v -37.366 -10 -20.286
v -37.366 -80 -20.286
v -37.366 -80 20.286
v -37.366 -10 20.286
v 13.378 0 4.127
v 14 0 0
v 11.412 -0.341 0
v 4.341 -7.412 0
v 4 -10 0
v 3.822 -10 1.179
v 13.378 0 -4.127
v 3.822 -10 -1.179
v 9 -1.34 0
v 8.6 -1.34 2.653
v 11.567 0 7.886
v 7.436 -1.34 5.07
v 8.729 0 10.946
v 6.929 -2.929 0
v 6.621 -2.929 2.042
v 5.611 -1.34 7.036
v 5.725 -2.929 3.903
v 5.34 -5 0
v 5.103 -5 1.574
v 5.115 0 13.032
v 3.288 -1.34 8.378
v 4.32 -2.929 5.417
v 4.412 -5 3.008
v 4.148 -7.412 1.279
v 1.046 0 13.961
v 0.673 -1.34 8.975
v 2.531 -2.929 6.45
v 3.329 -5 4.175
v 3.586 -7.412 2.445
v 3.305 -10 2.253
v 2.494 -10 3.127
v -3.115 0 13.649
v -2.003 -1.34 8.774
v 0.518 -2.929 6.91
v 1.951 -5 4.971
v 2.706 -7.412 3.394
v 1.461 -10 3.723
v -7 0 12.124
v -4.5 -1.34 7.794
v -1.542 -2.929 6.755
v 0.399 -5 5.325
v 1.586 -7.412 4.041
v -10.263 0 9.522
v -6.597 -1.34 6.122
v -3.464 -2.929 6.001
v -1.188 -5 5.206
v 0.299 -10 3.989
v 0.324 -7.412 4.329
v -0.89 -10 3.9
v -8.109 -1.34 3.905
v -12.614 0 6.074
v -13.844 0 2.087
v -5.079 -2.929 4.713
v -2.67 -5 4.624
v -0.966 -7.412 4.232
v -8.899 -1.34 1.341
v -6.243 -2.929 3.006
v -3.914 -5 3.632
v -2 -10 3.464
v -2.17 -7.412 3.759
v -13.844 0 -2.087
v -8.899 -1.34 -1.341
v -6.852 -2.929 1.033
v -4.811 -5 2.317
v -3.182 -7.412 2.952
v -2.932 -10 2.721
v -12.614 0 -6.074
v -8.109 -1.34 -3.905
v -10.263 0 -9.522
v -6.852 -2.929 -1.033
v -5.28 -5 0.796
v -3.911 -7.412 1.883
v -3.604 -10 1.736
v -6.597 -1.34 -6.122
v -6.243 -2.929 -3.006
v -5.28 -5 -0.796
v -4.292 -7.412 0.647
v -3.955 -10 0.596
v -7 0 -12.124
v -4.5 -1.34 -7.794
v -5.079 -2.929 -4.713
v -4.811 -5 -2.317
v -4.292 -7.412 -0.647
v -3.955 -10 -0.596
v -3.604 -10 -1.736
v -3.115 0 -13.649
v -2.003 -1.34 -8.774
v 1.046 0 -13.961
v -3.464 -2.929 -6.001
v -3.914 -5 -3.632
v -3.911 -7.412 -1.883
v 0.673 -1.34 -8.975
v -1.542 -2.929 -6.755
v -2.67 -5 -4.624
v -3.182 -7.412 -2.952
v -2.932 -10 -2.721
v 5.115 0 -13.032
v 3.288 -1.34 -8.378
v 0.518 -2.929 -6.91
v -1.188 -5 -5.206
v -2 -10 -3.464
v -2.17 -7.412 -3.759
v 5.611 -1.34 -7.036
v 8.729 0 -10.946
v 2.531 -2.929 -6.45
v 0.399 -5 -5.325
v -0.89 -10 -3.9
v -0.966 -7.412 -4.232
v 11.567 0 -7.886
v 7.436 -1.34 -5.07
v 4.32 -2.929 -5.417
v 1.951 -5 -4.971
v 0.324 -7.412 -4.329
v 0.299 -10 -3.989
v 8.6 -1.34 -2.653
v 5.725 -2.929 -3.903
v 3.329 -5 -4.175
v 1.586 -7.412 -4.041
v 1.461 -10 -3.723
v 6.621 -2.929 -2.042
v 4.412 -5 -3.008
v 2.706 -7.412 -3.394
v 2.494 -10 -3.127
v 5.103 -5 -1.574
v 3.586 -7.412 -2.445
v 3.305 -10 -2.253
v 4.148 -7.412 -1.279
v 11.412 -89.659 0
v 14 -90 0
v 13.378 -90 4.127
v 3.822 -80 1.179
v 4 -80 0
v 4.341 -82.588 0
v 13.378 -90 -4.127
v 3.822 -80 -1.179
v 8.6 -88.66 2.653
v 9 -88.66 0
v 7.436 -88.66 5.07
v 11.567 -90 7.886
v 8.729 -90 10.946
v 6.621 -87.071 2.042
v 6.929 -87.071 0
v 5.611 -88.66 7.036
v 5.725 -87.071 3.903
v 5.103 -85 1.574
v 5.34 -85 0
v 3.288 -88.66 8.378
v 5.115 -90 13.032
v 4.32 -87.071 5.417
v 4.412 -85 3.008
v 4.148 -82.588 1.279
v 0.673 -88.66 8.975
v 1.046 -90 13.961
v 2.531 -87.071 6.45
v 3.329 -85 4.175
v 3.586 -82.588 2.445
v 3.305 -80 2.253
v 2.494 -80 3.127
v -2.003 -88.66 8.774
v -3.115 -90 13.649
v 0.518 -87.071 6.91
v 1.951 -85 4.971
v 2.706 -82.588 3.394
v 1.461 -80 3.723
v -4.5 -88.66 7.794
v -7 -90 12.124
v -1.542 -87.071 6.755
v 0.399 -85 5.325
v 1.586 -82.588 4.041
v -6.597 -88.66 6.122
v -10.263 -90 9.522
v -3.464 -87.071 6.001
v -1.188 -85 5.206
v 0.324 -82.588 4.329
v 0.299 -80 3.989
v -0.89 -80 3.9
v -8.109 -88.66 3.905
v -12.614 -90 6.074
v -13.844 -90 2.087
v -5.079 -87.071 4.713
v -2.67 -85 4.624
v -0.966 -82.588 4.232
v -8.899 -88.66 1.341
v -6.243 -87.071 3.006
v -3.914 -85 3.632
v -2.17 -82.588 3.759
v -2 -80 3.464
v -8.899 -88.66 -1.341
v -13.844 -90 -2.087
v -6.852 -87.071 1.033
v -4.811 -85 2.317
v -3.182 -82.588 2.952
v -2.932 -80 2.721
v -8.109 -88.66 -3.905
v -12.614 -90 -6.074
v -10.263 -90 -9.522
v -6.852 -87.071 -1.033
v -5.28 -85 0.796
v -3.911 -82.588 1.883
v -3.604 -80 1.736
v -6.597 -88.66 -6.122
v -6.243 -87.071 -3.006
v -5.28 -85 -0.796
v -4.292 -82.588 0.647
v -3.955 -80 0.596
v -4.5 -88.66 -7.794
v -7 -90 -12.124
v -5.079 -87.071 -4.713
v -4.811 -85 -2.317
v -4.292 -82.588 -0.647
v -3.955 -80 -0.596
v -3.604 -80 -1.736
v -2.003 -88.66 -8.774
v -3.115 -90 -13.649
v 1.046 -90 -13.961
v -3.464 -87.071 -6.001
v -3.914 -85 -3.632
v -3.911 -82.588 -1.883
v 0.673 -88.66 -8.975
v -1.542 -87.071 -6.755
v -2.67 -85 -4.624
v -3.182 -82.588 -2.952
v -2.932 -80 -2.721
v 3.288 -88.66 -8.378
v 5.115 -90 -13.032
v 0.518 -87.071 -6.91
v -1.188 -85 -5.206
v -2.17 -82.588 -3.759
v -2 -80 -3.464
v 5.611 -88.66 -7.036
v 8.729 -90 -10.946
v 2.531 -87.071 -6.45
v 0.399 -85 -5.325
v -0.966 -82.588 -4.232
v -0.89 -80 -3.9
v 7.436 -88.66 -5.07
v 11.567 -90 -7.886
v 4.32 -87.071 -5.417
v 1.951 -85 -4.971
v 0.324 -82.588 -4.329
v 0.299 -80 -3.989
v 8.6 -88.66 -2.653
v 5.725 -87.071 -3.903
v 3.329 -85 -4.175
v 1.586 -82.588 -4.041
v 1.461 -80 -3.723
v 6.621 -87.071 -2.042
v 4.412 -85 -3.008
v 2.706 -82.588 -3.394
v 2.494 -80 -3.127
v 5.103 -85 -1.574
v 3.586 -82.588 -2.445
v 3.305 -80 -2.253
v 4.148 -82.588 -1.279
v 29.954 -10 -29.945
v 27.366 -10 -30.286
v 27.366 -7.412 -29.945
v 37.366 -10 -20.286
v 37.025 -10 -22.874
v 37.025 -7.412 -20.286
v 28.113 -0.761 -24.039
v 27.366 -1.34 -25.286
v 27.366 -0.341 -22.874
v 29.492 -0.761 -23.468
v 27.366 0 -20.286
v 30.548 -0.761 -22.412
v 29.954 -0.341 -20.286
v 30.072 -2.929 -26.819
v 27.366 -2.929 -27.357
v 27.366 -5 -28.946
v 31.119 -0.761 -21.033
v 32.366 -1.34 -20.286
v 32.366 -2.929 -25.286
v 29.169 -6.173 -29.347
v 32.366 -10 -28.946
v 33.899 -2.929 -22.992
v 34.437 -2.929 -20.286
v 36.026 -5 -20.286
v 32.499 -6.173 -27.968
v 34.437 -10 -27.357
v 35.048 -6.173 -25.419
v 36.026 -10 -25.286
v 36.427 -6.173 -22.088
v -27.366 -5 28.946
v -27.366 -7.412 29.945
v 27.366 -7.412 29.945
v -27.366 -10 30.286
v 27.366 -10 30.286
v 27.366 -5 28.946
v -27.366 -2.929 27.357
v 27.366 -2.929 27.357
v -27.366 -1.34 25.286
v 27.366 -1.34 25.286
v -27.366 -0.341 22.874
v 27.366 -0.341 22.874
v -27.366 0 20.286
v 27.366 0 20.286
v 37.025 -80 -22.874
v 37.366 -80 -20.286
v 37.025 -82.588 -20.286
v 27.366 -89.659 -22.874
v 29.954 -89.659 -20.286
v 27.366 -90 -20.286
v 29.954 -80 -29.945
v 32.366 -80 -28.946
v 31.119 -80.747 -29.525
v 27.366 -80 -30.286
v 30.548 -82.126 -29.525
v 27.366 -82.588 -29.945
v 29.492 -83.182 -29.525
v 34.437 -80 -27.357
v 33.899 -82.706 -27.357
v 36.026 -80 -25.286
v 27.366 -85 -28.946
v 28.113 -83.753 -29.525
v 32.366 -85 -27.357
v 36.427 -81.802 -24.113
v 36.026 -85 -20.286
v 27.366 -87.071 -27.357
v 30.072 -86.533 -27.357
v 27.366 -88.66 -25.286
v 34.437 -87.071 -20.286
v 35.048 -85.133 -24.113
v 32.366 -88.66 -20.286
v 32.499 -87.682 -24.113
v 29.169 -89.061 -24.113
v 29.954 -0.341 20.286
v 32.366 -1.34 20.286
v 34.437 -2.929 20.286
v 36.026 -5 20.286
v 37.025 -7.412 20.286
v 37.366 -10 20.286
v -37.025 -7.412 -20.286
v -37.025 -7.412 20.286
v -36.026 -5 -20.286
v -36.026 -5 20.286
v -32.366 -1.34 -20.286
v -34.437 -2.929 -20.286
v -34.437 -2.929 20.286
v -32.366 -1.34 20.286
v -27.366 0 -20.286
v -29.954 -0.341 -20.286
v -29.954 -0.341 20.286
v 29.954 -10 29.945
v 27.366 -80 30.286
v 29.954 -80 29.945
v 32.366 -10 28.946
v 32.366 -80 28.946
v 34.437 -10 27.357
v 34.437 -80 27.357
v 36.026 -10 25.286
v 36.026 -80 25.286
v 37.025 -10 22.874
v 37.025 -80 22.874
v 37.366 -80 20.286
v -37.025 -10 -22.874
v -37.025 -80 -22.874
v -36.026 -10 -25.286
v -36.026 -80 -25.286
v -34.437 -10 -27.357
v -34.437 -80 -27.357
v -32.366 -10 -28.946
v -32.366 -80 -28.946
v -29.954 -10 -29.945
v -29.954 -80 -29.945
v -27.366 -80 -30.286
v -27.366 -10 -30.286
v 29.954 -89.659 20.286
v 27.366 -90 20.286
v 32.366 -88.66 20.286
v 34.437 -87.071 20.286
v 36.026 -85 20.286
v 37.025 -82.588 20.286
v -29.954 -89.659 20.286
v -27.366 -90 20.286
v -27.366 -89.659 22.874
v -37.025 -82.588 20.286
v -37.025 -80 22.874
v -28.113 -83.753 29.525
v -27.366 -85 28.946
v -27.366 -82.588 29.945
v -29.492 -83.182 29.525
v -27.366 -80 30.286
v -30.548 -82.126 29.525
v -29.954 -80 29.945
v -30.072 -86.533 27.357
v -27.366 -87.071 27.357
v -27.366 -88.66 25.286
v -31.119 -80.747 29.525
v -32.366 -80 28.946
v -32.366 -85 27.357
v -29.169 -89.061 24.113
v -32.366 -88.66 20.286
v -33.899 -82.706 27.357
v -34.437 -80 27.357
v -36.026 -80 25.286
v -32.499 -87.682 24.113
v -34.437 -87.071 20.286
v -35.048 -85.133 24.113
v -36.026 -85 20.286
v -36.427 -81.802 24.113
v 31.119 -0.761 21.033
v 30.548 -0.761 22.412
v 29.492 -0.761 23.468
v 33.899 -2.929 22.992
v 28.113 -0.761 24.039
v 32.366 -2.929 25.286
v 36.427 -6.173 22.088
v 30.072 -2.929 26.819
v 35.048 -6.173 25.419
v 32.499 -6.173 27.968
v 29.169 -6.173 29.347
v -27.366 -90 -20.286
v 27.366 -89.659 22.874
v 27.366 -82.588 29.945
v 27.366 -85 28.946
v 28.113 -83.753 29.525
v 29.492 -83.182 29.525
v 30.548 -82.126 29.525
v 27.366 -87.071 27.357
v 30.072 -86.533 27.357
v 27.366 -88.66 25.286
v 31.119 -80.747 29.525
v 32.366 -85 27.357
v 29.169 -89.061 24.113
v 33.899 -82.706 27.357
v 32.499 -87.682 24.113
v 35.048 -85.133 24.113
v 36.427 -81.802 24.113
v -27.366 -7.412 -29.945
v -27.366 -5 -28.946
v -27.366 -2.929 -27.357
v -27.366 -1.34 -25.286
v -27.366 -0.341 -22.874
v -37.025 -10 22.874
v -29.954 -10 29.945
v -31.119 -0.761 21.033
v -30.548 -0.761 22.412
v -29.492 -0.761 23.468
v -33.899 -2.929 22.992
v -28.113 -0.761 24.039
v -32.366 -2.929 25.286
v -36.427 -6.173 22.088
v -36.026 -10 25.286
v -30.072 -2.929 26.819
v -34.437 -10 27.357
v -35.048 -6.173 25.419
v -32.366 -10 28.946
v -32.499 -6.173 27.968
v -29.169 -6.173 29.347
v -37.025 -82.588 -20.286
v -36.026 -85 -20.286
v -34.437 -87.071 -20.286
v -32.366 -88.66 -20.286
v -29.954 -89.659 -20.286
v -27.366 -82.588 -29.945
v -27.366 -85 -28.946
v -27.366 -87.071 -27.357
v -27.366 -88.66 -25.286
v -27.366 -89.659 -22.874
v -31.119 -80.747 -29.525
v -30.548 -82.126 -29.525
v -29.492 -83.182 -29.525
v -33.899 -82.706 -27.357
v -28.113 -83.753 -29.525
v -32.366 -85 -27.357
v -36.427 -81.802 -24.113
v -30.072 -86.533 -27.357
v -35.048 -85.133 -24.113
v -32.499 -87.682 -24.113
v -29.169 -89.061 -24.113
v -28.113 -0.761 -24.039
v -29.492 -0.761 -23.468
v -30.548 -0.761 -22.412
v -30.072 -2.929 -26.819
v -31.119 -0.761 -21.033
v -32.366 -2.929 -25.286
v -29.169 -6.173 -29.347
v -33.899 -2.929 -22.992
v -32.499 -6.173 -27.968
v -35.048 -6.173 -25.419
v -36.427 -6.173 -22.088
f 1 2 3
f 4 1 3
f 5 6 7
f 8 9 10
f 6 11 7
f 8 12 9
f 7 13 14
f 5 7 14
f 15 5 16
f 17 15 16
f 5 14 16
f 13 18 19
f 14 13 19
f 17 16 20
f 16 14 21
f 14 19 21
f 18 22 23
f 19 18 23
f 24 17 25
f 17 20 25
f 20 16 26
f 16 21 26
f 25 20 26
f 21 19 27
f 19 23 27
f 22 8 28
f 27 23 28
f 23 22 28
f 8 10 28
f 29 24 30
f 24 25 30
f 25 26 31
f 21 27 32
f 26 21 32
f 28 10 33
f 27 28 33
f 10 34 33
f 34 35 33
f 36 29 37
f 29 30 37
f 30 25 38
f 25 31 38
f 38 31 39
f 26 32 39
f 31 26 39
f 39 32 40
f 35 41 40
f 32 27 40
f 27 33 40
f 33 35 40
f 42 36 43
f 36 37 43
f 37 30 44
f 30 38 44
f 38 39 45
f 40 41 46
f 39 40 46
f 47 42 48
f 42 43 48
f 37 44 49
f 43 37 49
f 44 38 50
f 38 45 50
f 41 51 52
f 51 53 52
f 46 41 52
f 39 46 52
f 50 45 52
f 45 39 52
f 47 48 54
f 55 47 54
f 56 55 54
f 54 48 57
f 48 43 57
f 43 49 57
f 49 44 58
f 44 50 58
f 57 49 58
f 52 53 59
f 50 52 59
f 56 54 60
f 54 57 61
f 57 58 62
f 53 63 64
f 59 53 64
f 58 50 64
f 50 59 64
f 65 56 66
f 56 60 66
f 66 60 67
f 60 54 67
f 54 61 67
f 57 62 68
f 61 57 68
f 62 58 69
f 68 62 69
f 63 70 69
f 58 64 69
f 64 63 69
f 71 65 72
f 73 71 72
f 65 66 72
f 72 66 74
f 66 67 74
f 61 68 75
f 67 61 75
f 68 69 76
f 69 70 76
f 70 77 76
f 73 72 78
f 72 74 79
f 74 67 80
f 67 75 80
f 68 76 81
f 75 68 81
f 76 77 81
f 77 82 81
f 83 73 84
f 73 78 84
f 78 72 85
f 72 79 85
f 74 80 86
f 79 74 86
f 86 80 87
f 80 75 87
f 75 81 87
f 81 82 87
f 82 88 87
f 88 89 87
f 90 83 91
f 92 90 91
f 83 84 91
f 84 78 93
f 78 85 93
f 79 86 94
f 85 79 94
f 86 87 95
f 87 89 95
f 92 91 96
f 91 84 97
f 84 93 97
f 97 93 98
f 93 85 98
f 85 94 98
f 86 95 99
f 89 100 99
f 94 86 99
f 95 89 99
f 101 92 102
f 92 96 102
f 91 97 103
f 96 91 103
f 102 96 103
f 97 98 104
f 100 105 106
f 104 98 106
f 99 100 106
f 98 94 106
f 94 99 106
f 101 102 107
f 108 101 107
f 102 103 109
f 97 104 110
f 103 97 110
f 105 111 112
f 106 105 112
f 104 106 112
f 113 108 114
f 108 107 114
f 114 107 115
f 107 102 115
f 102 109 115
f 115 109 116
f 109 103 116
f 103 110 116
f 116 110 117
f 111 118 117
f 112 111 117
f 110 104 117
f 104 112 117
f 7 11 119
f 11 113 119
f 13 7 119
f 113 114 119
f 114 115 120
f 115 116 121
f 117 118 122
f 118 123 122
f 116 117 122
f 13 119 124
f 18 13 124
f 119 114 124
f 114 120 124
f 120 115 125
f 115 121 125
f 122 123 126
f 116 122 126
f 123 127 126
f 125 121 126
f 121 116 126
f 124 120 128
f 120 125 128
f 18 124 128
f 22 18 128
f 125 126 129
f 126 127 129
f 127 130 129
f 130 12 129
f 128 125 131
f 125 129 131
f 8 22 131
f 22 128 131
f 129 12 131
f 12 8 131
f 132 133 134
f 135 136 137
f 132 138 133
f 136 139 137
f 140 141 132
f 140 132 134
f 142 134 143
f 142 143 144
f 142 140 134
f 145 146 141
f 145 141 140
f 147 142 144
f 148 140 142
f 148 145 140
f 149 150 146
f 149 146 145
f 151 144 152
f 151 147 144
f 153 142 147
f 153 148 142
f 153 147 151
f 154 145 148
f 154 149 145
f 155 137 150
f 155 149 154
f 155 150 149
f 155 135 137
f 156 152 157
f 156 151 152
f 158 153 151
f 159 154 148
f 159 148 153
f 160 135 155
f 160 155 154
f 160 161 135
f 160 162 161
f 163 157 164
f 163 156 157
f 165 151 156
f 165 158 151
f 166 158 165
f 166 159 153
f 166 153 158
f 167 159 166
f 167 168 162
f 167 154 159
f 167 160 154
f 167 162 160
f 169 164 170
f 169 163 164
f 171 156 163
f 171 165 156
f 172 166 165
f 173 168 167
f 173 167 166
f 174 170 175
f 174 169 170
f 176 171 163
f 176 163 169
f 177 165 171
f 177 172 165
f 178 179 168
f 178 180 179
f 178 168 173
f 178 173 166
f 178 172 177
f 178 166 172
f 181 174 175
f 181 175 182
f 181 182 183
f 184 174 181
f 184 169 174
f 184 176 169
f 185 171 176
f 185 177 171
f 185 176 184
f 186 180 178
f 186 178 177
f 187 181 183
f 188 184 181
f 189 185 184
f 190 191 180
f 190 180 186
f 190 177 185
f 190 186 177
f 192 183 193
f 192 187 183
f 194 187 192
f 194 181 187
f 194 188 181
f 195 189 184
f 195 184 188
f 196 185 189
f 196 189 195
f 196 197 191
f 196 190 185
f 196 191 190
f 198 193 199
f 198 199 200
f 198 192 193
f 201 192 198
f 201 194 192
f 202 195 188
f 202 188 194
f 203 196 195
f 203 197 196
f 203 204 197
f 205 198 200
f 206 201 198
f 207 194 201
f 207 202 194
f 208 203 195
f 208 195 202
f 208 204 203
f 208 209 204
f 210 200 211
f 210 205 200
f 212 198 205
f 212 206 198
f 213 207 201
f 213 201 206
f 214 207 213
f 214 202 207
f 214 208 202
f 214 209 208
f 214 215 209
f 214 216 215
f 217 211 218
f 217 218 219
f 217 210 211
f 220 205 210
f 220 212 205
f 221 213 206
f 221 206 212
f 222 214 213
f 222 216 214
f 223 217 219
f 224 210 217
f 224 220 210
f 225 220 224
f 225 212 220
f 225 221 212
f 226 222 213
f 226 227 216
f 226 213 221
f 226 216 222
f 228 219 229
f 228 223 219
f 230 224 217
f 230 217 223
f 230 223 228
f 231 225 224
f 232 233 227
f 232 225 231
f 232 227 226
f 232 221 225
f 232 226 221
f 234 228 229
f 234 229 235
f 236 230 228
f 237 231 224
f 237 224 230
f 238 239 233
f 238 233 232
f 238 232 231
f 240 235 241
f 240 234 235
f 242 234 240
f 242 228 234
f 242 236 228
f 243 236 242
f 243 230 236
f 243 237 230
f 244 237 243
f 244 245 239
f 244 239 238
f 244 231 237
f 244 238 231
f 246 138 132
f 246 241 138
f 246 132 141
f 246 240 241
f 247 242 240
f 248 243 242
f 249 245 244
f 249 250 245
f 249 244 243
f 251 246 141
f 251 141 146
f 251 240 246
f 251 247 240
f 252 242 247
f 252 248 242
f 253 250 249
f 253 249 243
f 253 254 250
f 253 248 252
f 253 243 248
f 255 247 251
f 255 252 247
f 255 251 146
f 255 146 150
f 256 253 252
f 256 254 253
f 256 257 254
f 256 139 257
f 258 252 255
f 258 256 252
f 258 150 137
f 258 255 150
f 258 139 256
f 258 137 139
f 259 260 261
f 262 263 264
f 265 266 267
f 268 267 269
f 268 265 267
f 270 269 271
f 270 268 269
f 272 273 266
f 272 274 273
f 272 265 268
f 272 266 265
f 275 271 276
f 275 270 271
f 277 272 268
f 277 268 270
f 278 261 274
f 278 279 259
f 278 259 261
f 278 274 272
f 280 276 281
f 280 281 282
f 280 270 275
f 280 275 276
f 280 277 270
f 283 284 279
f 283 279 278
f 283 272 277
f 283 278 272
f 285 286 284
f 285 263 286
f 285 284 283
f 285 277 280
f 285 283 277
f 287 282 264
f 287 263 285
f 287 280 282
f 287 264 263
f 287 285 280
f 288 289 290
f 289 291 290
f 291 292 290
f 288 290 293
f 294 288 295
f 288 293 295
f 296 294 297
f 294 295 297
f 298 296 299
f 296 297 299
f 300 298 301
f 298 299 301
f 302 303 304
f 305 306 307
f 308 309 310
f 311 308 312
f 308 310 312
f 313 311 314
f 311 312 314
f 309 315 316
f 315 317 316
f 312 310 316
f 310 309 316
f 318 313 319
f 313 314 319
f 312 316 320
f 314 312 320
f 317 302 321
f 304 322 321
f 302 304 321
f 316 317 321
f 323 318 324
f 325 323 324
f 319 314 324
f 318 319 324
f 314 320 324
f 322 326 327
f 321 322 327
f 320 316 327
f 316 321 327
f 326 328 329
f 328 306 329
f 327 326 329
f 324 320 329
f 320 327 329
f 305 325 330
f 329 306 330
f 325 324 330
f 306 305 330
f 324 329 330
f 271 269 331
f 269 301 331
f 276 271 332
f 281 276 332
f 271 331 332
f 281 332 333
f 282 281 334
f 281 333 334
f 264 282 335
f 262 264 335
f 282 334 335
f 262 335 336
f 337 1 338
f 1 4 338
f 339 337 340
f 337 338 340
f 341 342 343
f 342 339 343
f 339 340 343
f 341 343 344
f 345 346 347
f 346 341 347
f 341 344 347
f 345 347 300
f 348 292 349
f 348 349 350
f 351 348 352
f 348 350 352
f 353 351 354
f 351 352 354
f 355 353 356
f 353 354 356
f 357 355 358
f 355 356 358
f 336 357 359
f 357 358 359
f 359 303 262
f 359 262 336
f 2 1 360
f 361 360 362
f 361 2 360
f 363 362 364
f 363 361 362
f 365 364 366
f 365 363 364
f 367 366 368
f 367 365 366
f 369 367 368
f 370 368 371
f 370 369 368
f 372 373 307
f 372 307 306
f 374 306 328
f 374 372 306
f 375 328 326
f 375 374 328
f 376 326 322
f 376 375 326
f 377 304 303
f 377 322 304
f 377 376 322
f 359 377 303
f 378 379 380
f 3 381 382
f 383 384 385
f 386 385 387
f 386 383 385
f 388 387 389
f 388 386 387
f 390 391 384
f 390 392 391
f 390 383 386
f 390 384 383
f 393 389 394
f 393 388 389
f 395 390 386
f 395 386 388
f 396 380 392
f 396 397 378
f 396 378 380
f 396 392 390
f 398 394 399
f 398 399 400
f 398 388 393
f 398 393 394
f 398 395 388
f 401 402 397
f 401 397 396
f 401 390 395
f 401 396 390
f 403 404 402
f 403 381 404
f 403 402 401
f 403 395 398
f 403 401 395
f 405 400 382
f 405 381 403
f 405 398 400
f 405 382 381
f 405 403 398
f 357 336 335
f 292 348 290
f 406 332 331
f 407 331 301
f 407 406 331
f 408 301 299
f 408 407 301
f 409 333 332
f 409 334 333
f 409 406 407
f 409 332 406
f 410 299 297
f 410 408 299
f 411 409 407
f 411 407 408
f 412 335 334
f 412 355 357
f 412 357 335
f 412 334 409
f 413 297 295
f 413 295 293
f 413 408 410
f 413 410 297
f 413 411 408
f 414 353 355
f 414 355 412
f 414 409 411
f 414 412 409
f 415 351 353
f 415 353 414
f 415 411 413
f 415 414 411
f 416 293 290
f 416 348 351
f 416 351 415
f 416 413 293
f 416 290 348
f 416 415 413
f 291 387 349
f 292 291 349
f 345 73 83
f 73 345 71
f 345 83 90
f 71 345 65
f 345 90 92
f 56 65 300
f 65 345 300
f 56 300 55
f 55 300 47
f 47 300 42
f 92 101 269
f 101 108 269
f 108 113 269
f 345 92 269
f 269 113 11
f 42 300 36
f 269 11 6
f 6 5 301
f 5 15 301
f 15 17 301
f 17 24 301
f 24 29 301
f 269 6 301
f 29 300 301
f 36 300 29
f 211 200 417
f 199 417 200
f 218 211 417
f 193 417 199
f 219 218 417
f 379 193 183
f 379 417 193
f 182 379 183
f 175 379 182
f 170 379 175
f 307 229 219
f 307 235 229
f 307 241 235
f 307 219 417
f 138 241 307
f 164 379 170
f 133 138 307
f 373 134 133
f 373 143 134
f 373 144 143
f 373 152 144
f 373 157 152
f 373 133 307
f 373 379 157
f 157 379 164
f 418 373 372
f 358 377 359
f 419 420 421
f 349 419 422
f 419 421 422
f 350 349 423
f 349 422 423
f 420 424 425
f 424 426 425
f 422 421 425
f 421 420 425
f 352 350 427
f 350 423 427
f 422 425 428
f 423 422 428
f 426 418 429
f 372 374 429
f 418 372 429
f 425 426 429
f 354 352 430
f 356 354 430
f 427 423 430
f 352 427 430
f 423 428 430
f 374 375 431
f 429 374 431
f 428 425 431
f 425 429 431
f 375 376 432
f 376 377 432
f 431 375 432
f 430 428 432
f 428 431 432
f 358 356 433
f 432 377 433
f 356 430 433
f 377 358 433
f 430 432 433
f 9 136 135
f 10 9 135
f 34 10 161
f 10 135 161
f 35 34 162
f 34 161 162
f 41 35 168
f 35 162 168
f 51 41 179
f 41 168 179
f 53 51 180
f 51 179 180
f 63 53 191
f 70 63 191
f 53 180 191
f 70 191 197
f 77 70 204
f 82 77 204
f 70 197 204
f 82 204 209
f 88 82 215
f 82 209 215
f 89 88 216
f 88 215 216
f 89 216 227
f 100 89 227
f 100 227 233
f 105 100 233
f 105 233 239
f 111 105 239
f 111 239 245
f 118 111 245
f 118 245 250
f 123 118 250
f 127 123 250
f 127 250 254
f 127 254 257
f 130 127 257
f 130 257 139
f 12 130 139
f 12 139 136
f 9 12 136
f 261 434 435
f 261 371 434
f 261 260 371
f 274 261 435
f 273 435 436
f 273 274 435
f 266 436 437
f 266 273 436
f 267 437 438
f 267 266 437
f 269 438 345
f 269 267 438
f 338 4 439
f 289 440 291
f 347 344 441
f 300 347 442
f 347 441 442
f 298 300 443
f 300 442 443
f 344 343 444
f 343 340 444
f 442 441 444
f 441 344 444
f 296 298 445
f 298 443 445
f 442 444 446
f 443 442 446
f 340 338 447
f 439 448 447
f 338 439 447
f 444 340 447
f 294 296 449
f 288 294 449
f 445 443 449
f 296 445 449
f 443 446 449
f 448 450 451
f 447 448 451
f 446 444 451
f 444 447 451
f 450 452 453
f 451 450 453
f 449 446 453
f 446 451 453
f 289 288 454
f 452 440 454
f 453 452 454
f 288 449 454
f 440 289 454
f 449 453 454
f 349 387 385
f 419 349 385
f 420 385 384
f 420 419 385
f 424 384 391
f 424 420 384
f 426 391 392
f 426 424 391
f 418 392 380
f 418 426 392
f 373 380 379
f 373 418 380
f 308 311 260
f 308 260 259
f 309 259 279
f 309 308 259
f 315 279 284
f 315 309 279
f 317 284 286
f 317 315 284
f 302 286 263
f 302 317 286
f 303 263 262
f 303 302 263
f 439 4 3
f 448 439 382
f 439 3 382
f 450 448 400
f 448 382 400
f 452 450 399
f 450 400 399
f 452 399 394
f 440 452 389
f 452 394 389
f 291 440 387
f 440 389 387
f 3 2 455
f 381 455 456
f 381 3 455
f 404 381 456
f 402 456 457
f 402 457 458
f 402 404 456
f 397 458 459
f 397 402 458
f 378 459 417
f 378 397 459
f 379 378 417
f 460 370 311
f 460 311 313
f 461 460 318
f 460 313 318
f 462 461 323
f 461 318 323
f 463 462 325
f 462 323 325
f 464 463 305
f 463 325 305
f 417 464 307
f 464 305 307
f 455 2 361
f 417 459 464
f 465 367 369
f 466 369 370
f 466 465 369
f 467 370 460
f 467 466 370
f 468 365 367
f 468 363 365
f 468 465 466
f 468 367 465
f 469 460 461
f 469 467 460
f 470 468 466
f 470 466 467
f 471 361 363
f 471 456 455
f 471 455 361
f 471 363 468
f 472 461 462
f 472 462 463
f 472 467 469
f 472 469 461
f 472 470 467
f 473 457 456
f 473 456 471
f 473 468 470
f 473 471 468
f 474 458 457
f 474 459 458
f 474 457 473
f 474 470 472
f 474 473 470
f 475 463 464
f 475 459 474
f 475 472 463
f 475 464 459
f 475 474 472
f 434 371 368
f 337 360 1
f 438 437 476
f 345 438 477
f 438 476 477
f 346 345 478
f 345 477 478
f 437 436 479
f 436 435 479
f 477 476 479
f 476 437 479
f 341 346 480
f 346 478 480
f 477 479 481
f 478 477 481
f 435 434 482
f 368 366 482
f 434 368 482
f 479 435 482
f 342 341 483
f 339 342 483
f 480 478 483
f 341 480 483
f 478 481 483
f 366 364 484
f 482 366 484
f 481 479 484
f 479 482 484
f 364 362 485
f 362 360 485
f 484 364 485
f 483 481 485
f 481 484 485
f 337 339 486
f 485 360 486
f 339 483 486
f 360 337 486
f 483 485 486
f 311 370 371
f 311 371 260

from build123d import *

# Parameters (mm, degrees)
F0_W     = 74.732258
F0_H     = 60.57189
F1_DEPTH = 90
F2_R     = 4
F3_DEPTH = 90.001
F4_R     = 10


with BuildPart() as f1:
    # F0 (on Front) → F1 (new body)
    with BuildSketch(Plane.XZ):
        Rectangle(F0_W, F0_H)
    extrude(amount=F1_DEPTH)

    # F2 (on face) → F3 (cut, through all)
    with BuildSketch(Plane.XZ.offset(90)):
        Circle(F2_R)
    extrude(amount=-F3_DEPTH, mode=Mode.SUBTRACT)

    # F4
    f4_edges = [f1.edges().sort_by_distance(p)[0] for p in [
        (-37.366129, -90, 0),
        (37.366129, -90, 0),
        (0, -90, 30.285945),
        (-37.366129, -45, -30.285945),
        (37.366129, -45, -30.285945),
        (0, 0, -30.285945),
        (37.366129, -45, 30.285945),
        (37.366129, 0, 0),
        (-37.366129, -45, 30.285945),
        (-37.366129, 0, 0),
        (0, 0, 30.285945),
        (-4, -90, 0),
        (-4, 0, 0),
        (0, -90, -30.285945),
    ]]
    fillet(f4_edges, radius=F4_R)


solid = f1.part
